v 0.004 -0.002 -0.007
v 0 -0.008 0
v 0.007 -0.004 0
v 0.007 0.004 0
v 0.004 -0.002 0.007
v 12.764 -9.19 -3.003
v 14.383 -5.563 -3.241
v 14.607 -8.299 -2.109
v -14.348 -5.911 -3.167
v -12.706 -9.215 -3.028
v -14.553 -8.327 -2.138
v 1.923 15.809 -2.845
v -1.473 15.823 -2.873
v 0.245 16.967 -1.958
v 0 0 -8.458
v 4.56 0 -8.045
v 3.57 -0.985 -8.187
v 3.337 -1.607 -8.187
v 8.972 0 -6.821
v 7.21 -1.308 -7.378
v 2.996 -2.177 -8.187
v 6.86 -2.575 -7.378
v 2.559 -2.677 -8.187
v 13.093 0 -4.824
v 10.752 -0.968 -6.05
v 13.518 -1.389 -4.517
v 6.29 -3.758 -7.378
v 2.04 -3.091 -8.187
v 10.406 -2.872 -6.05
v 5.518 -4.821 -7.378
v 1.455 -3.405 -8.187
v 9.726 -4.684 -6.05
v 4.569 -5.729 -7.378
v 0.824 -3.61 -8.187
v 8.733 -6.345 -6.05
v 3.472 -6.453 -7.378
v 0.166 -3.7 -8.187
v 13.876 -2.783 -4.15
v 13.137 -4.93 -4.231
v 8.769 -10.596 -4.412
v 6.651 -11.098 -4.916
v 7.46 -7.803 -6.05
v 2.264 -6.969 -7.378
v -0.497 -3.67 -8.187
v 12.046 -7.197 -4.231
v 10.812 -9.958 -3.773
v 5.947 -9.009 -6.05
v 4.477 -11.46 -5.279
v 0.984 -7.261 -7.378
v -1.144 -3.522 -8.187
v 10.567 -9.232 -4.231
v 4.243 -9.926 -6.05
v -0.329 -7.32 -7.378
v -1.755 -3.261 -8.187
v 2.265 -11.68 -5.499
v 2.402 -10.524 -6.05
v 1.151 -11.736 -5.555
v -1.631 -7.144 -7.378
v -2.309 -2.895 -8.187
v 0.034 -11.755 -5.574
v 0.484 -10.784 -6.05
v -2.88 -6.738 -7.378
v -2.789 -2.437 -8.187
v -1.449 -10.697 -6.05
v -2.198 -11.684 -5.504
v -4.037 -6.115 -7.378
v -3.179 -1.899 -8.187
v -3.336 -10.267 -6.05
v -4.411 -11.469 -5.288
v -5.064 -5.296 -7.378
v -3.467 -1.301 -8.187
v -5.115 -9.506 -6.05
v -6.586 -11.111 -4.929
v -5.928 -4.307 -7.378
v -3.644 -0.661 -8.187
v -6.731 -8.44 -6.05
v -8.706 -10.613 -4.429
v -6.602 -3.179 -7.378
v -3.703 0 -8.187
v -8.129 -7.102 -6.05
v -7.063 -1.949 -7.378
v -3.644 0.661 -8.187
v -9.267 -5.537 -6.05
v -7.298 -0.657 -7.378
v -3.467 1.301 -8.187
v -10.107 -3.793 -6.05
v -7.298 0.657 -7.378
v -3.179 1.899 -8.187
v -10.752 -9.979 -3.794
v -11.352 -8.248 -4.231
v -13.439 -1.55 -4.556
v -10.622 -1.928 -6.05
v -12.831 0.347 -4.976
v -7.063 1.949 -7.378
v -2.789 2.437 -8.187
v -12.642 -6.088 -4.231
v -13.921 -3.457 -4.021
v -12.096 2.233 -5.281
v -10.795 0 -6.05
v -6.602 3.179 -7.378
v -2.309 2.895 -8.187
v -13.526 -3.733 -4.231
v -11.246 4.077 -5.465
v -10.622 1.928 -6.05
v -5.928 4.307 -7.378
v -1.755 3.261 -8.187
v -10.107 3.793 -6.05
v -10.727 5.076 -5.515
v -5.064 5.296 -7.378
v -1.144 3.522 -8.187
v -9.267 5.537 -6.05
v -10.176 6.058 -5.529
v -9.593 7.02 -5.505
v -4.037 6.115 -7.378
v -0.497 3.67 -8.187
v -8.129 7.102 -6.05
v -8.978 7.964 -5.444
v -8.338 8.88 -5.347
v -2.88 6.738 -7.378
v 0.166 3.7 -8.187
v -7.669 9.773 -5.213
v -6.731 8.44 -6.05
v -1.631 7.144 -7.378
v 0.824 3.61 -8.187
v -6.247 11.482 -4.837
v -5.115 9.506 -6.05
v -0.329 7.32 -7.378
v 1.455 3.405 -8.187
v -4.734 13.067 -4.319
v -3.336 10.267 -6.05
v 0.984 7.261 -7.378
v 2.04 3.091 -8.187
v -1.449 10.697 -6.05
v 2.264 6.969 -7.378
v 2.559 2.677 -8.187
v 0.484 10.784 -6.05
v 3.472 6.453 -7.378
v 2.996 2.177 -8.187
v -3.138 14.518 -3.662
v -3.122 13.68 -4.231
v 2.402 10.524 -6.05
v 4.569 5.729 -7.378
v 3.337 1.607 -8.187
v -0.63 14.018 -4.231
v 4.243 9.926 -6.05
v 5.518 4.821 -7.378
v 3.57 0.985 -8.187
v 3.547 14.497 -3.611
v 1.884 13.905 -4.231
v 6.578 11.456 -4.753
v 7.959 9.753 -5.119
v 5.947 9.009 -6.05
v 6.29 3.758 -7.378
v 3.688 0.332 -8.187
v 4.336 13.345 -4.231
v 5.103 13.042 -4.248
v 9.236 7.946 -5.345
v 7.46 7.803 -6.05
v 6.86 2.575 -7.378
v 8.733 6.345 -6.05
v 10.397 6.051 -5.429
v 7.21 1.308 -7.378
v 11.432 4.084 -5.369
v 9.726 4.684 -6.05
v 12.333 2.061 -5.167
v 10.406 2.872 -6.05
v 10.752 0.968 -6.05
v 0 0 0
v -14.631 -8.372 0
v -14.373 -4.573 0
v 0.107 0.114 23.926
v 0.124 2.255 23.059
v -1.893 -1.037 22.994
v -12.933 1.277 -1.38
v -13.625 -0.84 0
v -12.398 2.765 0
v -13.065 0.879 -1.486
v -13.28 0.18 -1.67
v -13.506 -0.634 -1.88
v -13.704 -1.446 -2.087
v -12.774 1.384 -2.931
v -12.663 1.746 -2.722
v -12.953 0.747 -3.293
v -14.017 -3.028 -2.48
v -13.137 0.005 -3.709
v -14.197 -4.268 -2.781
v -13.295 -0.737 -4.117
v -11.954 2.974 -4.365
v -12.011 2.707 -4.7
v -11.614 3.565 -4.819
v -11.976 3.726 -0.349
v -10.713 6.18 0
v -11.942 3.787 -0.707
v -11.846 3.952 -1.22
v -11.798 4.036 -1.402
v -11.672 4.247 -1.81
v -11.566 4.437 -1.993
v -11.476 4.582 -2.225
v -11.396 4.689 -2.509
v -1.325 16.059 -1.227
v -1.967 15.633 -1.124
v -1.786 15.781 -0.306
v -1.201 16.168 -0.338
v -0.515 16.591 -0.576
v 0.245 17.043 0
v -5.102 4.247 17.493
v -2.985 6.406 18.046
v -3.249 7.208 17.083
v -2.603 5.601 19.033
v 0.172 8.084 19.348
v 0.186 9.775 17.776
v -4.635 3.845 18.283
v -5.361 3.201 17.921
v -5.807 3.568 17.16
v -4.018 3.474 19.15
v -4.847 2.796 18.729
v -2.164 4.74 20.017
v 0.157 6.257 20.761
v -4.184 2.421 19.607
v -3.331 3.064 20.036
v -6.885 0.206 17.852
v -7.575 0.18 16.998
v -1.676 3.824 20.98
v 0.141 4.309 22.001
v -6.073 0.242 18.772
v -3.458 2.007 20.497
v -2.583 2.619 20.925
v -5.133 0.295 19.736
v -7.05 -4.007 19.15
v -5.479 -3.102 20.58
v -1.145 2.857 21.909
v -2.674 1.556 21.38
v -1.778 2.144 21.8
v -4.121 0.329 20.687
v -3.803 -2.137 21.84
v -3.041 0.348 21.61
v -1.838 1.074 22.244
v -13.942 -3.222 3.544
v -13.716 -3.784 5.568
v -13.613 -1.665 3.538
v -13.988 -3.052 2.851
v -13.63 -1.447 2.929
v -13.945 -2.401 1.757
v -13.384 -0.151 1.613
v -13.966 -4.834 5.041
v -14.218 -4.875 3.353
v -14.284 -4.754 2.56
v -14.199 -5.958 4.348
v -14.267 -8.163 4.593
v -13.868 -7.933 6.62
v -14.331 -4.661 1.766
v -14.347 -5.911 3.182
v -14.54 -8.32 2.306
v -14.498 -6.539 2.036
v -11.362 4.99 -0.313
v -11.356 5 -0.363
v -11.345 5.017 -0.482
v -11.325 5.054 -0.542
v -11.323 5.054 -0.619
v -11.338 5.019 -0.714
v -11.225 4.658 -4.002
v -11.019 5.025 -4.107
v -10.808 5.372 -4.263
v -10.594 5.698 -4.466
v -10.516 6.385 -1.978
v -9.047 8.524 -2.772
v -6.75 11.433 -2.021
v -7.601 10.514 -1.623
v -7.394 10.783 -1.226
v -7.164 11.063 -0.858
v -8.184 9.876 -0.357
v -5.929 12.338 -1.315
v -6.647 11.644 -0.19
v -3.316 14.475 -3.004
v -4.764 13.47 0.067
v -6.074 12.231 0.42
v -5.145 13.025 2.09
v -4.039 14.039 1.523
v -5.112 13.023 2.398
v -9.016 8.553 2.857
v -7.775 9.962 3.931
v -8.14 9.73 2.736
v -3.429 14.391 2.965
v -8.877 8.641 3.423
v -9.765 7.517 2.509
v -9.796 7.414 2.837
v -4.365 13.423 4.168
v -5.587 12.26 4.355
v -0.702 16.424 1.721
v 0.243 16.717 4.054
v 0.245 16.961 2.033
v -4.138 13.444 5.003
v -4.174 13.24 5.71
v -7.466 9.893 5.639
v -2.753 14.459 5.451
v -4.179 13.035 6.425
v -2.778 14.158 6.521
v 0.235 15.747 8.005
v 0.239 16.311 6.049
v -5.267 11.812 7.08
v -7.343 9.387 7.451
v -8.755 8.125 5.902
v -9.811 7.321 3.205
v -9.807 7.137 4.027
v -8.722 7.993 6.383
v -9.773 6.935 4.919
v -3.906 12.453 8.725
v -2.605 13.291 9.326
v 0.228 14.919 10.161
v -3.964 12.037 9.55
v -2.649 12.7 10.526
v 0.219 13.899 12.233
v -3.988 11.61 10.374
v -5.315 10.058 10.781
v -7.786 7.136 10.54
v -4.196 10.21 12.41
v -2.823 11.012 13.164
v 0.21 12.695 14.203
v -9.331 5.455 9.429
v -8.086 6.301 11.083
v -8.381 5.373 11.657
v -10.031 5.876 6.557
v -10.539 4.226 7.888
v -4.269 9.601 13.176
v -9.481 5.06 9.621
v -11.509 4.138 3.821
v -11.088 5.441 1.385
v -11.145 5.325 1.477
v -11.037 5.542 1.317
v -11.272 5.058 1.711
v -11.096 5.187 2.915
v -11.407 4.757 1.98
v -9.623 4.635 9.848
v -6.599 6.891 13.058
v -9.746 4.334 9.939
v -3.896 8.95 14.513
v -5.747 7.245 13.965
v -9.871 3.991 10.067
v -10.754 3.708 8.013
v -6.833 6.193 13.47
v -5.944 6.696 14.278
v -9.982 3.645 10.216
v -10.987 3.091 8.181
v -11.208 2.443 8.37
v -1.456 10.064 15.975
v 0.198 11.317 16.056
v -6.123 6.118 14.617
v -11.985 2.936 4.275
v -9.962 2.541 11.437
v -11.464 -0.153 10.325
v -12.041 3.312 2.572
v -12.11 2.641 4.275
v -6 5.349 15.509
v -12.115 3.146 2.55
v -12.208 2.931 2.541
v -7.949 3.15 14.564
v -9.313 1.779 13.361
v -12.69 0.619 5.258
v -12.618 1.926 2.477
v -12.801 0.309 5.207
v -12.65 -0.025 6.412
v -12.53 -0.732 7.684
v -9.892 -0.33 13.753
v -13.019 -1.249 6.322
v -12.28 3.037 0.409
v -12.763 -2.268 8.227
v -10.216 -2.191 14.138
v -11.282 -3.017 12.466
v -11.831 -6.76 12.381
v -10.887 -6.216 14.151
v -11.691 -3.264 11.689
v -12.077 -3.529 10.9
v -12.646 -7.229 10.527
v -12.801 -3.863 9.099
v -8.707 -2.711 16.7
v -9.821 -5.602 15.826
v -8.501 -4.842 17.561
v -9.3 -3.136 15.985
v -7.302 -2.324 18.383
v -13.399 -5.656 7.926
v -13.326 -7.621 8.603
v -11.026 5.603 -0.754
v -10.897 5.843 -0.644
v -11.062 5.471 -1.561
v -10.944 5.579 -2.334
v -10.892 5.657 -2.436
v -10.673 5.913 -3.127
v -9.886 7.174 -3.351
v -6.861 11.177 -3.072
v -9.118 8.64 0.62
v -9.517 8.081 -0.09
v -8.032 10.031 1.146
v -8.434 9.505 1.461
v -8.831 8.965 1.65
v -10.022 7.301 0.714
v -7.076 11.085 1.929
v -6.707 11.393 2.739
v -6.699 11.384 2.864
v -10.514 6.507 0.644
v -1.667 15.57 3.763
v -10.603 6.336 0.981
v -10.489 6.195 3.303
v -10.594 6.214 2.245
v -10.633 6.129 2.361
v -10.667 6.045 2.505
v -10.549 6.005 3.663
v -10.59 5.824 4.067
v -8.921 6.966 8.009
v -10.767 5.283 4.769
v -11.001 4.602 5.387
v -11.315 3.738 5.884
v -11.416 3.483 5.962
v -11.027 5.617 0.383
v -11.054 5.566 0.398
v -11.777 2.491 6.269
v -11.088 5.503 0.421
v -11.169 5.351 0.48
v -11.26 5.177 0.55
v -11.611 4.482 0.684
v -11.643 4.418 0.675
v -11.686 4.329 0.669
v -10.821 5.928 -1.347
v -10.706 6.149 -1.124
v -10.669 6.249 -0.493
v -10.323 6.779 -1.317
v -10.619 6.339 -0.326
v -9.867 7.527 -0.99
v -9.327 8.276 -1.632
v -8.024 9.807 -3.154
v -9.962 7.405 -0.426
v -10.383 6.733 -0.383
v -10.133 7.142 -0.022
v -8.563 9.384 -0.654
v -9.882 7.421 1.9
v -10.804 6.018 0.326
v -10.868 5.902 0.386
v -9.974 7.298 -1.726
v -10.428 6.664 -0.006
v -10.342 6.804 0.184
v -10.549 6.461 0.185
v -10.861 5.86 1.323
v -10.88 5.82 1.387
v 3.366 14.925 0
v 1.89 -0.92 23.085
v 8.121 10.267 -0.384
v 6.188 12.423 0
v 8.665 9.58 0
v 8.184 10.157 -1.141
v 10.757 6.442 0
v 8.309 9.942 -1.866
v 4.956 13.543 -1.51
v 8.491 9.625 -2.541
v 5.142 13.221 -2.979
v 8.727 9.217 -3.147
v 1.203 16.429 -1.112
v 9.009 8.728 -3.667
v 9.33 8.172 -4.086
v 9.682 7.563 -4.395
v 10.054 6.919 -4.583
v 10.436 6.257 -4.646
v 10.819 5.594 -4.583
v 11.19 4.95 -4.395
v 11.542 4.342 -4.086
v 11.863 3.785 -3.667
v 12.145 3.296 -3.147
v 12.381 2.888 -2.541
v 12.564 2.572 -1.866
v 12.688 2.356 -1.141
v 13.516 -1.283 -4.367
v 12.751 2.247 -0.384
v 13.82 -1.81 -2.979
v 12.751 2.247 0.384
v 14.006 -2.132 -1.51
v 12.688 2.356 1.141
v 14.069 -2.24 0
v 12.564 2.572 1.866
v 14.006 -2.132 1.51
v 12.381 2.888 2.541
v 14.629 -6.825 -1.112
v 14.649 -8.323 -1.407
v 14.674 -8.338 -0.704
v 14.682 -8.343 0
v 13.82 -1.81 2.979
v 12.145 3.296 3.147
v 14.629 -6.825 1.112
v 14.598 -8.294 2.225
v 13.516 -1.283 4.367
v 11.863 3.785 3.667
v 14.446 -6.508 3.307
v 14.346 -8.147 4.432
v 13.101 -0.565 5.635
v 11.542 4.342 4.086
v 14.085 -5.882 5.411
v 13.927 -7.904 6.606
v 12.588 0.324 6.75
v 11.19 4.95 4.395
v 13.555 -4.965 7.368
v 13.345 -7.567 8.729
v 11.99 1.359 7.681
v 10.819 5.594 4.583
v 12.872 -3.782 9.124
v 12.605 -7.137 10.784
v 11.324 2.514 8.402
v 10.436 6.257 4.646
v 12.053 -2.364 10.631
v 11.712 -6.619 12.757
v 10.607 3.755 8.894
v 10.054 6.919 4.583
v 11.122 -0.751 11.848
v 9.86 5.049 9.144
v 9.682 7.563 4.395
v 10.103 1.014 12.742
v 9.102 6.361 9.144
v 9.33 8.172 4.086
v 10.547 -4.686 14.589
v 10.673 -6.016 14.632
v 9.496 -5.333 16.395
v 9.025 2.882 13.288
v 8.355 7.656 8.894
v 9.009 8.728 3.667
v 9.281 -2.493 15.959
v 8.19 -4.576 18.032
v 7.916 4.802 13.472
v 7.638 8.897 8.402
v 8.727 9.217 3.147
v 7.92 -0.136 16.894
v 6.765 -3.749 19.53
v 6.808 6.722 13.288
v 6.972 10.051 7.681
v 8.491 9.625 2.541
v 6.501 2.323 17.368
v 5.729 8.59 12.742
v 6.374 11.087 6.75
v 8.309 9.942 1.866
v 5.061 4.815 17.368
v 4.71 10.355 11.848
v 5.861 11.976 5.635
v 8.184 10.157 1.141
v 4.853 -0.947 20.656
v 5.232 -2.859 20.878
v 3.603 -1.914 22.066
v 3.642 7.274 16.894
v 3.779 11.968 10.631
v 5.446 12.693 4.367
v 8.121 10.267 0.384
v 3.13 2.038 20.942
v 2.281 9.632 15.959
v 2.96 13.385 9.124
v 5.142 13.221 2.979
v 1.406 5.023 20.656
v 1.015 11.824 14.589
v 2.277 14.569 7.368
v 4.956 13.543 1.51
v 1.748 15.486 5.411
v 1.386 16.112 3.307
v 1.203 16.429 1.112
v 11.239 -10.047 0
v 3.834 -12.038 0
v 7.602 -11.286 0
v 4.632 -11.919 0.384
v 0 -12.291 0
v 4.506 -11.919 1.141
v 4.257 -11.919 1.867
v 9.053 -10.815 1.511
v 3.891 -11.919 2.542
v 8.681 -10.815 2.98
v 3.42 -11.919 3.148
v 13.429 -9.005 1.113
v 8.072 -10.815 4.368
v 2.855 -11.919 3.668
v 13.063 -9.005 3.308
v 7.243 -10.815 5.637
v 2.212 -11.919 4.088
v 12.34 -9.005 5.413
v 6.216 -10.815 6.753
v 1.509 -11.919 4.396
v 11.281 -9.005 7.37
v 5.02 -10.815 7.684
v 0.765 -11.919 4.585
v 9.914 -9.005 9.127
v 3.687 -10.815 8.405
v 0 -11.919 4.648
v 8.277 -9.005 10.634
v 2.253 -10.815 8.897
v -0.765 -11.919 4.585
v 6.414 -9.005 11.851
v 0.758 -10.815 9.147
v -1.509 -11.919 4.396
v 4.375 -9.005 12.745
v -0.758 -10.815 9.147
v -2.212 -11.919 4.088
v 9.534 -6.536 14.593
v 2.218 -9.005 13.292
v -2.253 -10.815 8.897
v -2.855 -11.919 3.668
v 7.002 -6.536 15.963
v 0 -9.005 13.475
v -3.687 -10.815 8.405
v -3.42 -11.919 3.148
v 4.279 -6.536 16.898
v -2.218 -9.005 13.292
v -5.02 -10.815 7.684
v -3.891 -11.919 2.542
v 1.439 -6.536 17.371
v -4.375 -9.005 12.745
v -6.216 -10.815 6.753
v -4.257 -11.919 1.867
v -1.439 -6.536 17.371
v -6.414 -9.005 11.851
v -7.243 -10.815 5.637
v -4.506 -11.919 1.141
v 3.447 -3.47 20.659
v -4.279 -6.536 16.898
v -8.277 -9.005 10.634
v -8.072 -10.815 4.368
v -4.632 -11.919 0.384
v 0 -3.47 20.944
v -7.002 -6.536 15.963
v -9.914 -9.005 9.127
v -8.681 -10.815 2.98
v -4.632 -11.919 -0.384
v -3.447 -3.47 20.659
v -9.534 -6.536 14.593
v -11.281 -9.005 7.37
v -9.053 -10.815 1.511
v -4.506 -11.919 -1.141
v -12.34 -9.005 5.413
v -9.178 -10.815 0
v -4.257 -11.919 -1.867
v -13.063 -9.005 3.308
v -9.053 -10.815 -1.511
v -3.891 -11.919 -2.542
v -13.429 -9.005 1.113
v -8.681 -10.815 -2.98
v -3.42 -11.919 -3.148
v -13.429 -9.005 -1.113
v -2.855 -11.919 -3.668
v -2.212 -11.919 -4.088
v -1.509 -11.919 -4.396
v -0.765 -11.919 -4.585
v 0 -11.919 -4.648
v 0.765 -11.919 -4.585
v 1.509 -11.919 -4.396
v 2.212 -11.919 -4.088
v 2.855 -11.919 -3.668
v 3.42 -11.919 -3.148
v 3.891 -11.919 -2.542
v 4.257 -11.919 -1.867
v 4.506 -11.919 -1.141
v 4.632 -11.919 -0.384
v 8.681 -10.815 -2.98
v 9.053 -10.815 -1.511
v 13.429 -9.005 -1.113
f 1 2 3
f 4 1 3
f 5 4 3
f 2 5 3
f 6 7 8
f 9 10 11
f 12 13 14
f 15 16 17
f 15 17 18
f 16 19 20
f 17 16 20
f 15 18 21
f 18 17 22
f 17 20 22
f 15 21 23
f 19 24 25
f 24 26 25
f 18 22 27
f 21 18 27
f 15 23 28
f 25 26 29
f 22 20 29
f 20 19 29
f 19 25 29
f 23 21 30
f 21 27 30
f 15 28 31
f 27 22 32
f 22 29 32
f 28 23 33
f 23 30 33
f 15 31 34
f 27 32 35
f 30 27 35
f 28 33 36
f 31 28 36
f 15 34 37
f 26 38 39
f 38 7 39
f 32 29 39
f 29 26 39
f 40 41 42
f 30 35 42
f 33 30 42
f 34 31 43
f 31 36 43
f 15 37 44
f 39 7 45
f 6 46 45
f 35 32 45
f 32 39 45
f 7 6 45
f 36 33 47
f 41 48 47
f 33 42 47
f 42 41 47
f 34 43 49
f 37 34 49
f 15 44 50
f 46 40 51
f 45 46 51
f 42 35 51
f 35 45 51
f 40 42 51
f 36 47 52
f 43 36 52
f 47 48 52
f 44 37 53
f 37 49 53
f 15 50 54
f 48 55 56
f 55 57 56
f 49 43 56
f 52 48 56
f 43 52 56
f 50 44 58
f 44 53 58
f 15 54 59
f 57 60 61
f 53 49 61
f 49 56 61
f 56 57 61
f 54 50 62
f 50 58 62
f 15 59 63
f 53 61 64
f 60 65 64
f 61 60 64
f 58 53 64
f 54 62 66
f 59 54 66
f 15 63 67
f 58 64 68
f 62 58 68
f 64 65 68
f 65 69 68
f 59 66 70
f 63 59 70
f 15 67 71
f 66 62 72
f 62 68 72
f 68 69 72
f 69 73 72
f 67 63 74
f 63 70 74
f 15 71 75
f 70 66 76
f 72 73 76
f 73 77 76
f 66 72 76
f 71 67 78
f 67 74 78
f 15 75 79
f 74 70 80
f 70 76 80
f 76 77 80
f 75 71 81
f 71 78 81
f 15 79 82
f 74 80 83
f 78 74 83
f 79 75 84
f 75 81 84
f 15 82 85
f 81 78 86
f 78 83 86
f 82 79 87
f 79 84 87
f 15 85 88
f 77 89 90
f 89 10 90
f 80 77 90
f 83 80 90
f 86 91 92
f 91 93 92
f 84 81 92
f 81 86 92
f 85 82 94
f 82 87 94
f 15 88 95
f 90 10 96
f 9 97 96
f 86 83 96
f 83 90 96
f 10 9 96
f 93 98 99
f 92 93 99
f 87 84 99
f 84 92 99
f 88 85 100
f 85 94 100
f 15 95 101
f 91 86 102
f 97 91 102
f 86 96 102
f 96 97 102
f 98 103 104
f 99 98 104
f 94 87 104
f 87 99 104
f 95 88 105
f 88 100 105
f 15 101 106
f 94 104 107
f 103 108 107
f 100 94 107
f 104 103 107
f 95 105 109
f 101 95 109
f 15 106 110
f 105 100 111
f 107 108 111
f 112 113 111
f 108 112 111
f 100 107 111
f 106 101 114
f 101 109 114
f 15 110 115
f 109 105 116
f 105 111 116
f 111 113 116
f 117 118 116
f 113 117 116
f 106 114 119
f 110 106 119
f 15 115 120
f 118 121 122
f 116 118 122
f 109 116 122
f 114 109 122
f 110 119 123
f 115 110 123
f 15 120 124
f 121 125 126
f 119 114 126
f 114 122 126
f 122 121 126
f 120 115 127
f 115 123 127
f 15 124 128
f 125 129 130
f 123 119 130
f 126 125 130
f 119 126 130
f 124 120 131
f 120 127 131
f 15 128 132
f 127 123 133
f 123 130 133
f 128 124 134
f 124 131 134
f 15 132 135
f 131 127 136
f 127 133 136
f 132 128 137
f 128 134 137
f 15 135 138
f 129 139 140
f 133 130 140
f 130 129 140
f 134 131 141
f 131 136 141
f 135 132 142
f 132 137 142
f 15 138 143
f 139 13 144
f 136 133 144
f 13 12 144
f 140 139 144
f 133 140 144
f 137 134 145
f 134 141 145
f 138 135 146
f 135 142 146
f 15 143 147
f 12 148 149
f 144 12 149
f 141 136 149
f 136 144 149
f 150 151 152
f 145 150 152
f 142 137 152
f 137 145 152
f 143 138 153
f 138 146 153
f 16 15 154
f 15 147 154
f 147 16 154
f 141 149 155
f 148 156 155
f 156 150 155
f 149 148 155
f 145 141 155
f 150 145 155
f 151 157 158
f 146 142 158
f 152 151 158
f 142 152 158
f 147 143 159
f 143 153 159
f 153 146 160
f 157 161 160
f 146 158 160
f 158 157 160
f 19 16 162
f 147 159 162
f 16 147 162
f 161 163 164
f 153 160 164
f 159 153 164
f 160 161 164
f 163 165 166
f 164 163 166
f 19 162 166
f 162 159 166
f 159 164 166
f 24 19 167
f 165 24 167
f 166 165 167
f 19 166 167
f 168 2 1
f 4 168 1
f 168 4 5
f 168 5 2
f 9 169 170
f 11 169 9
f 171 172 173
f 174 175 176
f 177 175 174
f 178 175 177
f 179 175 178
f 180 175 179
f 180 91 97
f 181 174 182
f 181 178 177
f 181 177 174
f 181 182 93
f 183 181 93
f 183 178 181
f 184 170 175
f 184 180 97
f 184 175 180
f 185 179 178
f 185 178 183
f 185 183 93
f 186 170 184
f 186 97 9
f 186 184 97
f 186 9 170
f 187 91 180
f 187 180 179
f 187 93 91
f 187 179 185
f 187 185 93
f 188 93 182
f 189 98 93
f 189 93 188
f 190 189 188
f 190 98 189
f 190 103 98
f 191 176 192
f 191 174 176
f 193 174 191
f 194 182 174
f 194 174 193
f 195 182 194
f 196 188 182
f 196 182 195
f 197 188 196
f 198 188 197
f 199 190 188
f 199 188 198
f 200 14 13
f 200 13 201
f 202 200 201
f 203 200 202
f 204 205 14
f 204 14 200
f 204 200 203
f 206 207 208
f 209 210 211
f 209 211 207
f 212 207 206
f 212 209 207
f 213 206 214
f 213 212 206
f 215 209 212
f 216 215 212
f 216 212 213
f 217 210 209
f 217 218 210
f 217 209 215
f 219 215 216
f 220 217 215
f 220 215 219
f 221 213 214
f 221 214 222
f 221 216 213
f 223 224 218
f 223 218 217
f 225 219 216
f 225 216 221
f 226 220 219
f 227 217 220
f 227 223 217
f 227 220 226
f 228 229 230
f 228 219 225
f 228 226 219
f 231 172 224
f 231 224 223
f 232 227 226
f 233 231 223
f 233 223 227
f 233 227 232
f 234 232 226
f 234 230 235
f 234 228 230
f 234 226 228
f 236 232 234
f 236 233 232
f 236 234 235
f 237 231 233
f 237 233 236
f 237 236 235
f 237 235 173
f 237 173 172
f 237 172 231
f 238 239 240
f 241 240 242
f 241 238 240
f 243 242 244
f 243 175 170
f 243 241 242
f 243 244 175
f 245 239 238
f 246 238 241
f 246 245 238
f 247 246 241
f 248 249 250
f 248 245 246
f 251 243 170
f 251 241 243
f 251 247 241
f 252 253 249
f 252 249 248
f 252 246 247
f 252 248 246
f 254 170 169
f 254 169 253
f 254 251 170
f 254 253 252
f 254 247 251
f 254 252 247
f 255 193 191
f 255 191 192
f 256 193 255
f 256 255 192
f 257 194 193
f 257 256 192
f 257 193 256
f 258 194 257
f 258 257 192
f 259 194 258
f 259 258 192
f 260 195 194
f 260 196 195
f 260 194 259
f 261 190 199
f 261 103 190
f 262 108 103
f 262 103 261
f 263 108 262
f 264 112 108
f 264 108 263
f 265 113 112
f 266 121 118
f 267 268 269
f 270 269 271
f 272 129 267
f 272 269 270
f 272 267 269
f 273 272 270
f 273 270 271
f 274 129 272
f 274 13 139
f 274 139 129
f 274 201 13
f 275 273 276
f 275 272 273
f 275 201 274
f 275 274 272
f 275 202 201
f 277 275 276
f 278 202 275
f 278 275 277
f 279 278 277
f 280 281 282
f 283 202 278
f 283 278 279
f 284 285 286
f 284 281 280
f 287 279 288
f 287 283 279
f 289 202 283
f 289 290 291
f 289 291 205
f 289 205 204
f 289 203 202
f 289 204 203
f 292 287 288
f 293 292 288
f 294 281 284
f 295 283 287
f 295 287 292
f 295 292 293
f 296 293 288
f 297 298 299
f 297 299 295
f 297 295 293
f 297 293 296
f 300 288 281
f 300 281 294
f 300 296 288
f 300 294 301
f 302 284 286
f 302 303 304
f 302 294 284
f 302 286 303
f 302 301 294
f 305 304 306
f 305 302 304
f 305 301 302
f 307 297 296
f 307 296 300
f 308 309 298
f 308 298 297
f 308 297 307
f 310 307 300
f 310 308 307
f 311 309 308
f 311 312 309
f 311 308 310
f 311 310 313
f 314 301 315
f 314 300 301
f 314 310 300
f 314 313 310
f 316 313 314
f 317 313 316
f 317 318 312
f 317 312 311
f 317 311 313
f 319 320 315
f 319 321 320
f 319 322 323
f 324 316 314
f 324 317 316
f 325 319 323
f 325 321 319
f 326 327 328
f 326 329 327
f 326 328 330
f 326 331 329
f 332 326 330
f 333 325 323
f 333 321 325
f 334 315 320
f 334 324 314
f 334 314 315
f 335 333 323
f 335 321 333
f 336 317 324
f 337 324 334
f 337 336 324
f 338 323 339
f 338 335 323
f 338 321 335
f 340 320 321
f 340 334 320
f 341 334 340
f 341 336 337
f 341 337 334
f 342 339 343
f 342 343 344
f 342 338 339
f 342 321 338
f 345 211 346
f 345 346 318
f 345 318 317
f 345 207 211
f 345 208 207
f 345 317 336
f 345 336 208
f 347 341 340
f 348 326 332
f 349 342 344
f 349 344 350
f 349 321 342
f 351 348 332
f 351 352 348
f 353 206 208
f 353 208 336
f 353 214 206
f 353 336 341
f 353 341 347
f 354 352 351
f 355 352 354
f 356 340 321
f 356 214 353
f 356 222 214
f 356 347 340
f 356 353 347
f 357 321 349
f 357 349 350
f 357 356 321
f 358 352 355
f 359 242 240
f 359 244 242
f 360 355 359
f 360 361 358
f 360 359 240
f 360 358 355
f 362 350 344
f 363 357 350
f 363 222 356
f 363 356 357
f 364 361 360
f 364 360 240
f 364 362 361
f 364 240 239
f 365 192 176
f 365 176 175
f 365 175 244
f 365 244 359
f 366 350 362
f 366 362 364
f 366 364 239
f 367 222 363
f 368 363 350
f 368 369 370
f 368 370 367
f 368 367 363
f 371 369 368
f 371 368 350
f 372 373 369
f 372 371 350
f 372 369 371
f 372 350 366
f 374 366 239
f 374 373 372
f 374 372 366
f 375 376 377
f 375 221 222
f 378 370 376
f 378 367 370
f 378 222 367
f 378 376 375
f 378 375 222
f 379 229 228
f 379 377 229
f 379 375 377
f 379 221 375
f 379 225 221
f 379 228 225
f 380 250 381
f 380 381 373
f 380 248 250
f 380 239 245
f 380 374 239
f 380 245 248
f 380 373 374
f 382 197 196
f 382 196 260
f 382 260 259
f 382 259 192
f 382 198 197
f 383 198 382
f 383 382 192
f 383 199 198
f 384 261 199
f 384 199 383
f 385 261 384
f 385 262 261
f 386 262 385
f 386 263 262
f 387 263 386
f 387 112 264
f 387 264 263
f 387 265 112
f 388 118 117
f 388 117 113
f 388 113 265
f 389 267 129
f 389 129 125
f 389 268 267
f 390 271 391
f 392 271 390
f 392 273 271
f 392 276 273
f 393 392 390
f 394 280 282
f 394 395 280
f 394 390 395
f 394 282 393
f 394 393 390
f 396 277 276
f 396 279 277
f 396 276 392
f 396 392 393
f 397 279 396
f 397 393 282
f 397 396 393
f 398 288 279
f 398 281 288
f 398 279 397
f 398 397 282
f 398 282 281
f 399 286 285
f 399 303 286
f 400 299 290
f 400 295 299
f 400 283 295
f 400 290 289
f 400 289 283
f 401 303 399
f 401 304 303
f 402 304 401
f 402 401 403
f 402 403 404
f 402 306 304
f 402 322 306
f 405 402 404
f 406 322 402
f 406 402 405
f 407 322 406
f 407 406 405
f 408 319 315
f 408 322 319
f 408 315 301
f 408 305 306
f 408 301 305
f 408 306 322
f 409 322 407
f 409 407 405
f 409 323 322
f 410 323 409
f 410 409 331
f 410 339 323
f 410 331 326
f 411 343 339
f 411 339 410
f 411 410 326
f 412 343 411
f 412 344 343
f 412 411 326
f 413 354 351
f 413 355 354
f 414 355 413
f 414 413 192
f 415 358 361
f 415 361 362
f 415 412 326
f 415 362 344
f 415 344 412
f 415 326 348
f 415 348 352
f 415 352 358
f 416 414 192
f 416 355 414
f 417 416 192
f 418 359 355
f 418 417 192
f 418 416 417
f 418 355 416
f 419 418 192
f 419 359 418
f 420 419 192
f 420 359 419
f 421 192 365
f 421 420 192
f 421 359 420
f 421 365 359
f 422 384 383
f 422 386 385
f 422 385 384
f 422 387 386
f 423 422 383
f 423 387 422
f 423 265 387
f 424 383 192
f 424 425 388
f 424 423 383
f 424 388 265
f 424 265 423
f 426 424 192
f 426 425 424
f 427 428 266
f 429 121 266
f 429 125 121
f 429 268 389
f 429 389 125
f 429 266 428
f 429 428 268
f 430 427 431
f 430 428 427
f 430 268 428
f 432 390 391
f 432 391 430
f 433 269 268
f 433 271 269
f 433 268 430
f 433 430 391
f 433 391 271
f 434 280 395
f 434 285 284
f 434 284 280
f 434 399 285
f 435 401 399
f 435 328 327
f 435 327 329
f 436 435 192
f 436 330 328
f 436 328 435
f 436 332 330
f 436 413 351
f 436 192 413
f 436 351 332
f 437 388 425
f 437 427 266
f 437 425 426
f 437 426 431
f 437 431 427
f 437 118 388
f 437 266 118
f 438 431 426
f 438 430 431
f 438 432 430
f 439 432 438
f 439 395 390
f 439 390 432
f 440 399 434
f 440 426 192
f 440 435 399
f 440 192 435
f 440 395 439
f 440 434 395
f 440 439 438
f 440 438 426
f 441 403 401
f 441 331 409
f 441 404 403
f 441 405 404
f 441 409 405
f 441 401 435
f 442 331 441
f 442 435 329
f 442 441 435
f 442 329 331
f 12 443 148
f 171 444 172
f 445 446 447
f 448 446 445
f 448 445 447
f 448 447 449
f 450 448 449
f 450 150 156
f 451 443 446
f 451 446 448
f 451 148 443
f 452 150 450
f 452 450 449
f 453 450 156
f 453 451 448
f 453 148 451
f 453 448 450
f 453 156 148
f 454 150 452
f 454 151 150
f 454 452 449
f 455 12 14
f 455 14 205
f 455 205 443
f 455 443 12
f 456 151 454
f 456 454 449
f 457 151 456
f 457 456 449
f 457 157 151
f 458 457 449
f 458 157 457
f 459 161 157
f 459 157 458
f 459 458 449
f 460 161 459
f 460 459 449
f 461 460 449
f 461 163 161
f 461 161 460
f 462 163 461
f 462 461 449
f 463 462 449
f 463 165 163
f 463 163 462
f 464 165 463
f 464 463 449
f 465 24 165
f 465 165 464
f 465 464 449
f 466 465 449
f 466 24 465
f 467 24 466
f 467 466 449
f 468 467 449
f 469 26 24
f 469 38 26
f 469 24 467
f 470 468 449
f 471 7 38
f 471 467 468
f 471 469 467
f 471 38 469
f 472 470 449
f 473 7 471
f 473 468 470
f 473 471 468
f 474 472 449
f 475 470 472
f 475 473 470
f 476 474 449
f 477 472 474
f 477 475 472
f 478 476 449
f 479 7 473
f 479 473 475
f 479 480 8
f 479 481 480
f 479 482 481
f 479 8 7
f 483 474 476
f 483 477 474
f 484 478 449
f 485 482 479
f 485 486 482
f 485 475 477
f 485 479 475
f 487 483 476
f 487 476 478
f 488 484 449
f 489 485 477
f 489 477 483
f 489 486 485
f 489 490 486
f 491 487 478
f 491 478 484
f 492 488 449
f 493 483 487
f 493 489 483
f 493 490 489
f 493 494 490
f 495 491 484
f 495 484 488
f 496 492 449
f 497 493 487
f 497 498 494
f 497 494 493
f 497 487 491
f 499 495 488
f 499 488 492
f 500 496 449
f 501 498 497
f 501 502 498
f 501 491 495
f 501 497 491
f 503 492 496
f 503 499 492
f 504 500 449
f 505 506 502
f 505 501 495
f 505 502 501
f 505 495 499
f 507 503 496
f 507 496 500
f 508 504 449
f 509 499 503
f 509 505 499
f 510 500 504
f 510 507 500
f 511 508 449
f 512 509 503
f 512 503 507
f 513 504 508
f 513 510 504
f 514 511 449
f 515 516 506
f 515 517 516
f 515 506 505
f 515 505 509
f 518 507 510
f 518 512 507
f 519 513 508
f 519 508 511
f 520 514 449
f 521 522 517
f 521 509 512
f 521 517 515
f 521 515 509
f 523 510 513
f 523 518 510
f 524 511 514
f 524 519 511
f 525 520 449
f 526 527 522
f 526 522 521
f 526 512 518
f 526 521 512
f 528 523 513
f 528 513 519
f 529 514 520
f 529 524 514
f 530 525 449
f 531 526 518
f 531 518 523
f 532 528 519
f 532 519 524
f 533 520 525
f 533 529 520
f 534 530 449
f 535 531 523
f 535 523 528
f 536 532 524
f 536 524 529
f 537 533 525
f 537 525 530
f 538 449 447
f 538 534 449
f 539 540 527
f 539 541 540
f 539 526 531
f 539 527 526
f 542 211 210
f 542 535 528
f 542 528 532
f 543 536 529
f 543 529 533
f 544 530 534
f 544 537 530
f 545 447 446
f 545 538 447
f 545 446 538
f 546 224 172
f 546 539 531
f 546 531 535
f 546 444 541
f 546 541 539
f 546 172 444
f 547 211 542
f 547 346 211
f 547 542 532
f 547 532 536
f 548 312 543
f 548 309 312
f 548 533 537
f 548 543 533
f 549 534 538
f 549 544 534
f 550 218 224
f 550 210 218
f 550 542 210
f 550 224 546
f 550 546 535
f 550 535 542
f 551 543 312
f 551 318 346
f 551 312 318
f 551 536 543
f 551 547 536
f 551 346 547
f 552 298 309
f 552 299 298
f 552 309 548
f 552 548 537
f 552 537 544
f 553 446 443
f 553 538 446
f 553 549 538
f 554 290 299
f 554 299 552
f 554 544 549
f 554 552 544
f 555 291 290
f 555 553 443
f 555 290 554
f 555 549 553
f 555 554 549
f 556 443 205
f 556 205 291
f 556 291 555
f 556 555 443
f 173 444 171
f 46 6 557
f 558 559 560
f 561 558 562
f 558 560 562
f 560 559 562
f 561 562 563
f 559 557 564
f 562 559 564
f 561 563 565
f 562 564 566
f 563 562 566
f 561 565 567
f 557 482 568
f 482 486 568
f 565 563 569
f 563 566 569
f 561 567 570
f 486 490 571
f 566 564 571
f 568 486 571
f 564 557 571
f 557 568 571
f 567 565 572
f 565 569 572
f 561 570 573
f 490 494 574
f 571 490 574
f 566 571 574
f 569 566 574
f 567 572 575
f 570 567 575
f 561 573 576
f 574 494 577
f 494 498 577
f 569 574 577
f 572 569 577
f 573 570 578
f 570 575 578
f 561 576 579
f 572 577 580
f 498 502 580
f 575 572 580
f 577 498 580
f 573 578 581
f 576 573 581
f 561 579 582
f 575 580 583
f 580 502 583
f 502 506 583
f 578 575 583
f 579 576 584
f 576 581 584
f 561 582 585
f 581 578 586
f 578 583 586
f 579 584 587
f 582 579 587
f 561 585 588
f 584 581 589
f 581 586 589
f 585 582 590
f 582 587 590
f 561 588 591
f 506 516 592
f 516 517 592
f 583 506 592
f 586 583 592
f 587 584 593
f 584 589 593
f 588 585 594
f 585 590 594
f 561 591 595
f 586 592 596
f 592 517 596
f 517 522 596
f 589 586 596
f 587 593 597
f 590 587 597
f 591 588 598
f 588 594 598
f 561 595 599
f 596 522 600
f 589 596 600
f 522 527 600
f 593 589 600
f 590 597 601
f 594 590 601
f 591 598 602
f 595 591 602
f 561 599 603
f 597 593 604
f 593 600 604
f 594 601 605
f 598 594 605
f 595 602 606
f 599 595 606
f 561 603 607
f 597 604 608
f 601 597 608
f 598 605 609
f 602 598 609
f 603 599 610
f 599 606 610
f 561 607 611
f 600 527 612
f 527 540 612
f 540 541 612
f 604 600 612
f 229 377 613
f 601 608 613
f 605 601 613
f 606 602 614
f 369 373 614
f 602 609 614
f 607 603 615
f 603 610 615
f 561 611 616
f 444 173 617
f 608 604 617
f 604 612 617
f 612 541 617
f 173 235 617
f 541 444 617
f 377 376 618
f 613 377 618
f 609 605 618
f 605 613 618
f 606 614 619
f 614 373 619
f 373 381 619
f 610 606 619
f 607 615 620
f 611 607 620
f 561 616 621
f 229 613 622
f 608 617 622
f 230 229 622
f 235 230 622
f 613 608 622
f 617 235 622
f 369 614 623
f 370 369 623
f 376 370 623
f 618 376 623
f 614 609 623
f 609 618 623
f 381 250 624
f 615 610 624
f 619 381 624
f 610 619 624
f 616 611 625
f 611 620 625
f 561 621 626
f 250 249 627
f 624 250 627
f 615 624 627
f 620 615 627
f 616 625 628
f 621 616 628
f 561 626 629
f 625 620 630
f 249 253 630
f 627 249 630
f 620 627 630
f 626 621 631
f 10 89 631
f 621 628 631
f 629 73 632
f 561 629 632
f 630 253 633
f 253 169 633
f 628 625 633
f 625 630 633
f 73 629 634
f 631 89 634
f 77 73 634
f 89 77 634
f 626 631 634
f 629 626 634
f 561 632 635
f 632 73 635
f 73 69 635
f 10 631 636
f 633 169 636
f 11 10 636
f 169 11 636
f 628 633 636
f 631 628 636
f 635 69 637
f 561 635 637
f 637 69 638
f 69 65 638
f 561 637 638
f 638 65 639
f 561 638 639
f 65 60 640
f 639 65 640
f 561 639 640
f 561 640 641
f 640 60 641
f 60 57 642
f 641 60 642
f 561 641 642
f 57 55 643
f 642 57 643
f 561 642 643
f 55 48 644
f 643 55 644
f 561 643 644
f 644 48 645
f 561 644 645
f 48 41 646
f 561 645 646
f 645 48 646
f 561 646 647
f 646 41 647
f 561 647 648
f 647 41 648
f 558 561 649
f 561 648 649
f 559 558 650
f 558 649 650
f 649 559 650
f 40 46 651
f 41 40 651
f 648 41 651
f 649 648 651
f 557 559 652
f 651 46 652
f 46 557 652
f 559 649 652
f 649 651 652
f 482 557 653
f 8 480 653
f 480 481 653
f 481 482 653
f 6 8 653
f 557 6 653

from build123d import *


with BuildPart() as f5:
    # F4 (on Front) → F5 (revolve)
    with BuildSketch(Plane.XZ):
        with BuildLine():
            Line((0, 16.9418), (0, 0))
            Line((0, 0), (0, -8.4582))
            ThreePointArc((0, -8.4582), (25.4, 16.9418), (0, 42.3418))
            Line((0, 42.3418), (0, 16.9418))
        make_face()
    revolve(axis=Axis((0, 0, 16.9418), (0, 0, -1)))

    # F2 (on Top) → F6 (revolve, intersect)
    with BuildSketch(Plane.XY):
        with BuildLine():
            Line((0, 46.263021417), (0, -12.2905196622))
            ThreePointArc((0, -12.2905196622), (29.2767705396, 16.9862508774), (0, 46.263021417))
        make_face()
    revolve(axis=Axis((0, 16.9862508774, 0), (0, -1, 0)), mode=Mode.INTERSECT)

    # F3 (on Top) → F8 (revolve, intersect)
    with BuildSketch(Plane.XY):
        with BuildLine():
            Line((-39.9929191695, -22.8585096233), (10.7572382071, 6.4421073995))
            ThreePointArc((10.7572382071, 6.4421073995), (-29.2681489926, 17.1668775764), (-39.9929191695, -22.8585096233))
        make_face()
    revolve(axis=Axis((-14.6178404812, -8.2082011119, 0), (-0.8660254038, -0.5, 0)), mode=Mode.INTERSECT)

    # F1 (on Top) → F9 (revolve, intersect)
    with BuildSketch(Plane.XY):
        with BuildLine():
            Line((0, -0.0084829462), (0, 0))
            Line((0, 0), (-10.7133459402, 6.179514724))
            ThreePointArc((-10.7133459402, 6.179514724), (0.0151414181, -33.805722394), (39.9988528315, -23.0715503257))
            Line((39.9988528315, -23.0715503257), (14.6406725481, -8.4448175281))
            Line((14.6406725481, -8.4448175281), (0.0073489014, -0.0042388853))
            Line((0.0073489014, -0.0042388853), (0, -0.0084829462))
        make_face()
    revolve(axis=Axis((14.6427534456, -8.4460178008, 0), (0.8662297429, -0.4996459071, 0)), mode=Mode.INTERSECT)


solid = f5.part
